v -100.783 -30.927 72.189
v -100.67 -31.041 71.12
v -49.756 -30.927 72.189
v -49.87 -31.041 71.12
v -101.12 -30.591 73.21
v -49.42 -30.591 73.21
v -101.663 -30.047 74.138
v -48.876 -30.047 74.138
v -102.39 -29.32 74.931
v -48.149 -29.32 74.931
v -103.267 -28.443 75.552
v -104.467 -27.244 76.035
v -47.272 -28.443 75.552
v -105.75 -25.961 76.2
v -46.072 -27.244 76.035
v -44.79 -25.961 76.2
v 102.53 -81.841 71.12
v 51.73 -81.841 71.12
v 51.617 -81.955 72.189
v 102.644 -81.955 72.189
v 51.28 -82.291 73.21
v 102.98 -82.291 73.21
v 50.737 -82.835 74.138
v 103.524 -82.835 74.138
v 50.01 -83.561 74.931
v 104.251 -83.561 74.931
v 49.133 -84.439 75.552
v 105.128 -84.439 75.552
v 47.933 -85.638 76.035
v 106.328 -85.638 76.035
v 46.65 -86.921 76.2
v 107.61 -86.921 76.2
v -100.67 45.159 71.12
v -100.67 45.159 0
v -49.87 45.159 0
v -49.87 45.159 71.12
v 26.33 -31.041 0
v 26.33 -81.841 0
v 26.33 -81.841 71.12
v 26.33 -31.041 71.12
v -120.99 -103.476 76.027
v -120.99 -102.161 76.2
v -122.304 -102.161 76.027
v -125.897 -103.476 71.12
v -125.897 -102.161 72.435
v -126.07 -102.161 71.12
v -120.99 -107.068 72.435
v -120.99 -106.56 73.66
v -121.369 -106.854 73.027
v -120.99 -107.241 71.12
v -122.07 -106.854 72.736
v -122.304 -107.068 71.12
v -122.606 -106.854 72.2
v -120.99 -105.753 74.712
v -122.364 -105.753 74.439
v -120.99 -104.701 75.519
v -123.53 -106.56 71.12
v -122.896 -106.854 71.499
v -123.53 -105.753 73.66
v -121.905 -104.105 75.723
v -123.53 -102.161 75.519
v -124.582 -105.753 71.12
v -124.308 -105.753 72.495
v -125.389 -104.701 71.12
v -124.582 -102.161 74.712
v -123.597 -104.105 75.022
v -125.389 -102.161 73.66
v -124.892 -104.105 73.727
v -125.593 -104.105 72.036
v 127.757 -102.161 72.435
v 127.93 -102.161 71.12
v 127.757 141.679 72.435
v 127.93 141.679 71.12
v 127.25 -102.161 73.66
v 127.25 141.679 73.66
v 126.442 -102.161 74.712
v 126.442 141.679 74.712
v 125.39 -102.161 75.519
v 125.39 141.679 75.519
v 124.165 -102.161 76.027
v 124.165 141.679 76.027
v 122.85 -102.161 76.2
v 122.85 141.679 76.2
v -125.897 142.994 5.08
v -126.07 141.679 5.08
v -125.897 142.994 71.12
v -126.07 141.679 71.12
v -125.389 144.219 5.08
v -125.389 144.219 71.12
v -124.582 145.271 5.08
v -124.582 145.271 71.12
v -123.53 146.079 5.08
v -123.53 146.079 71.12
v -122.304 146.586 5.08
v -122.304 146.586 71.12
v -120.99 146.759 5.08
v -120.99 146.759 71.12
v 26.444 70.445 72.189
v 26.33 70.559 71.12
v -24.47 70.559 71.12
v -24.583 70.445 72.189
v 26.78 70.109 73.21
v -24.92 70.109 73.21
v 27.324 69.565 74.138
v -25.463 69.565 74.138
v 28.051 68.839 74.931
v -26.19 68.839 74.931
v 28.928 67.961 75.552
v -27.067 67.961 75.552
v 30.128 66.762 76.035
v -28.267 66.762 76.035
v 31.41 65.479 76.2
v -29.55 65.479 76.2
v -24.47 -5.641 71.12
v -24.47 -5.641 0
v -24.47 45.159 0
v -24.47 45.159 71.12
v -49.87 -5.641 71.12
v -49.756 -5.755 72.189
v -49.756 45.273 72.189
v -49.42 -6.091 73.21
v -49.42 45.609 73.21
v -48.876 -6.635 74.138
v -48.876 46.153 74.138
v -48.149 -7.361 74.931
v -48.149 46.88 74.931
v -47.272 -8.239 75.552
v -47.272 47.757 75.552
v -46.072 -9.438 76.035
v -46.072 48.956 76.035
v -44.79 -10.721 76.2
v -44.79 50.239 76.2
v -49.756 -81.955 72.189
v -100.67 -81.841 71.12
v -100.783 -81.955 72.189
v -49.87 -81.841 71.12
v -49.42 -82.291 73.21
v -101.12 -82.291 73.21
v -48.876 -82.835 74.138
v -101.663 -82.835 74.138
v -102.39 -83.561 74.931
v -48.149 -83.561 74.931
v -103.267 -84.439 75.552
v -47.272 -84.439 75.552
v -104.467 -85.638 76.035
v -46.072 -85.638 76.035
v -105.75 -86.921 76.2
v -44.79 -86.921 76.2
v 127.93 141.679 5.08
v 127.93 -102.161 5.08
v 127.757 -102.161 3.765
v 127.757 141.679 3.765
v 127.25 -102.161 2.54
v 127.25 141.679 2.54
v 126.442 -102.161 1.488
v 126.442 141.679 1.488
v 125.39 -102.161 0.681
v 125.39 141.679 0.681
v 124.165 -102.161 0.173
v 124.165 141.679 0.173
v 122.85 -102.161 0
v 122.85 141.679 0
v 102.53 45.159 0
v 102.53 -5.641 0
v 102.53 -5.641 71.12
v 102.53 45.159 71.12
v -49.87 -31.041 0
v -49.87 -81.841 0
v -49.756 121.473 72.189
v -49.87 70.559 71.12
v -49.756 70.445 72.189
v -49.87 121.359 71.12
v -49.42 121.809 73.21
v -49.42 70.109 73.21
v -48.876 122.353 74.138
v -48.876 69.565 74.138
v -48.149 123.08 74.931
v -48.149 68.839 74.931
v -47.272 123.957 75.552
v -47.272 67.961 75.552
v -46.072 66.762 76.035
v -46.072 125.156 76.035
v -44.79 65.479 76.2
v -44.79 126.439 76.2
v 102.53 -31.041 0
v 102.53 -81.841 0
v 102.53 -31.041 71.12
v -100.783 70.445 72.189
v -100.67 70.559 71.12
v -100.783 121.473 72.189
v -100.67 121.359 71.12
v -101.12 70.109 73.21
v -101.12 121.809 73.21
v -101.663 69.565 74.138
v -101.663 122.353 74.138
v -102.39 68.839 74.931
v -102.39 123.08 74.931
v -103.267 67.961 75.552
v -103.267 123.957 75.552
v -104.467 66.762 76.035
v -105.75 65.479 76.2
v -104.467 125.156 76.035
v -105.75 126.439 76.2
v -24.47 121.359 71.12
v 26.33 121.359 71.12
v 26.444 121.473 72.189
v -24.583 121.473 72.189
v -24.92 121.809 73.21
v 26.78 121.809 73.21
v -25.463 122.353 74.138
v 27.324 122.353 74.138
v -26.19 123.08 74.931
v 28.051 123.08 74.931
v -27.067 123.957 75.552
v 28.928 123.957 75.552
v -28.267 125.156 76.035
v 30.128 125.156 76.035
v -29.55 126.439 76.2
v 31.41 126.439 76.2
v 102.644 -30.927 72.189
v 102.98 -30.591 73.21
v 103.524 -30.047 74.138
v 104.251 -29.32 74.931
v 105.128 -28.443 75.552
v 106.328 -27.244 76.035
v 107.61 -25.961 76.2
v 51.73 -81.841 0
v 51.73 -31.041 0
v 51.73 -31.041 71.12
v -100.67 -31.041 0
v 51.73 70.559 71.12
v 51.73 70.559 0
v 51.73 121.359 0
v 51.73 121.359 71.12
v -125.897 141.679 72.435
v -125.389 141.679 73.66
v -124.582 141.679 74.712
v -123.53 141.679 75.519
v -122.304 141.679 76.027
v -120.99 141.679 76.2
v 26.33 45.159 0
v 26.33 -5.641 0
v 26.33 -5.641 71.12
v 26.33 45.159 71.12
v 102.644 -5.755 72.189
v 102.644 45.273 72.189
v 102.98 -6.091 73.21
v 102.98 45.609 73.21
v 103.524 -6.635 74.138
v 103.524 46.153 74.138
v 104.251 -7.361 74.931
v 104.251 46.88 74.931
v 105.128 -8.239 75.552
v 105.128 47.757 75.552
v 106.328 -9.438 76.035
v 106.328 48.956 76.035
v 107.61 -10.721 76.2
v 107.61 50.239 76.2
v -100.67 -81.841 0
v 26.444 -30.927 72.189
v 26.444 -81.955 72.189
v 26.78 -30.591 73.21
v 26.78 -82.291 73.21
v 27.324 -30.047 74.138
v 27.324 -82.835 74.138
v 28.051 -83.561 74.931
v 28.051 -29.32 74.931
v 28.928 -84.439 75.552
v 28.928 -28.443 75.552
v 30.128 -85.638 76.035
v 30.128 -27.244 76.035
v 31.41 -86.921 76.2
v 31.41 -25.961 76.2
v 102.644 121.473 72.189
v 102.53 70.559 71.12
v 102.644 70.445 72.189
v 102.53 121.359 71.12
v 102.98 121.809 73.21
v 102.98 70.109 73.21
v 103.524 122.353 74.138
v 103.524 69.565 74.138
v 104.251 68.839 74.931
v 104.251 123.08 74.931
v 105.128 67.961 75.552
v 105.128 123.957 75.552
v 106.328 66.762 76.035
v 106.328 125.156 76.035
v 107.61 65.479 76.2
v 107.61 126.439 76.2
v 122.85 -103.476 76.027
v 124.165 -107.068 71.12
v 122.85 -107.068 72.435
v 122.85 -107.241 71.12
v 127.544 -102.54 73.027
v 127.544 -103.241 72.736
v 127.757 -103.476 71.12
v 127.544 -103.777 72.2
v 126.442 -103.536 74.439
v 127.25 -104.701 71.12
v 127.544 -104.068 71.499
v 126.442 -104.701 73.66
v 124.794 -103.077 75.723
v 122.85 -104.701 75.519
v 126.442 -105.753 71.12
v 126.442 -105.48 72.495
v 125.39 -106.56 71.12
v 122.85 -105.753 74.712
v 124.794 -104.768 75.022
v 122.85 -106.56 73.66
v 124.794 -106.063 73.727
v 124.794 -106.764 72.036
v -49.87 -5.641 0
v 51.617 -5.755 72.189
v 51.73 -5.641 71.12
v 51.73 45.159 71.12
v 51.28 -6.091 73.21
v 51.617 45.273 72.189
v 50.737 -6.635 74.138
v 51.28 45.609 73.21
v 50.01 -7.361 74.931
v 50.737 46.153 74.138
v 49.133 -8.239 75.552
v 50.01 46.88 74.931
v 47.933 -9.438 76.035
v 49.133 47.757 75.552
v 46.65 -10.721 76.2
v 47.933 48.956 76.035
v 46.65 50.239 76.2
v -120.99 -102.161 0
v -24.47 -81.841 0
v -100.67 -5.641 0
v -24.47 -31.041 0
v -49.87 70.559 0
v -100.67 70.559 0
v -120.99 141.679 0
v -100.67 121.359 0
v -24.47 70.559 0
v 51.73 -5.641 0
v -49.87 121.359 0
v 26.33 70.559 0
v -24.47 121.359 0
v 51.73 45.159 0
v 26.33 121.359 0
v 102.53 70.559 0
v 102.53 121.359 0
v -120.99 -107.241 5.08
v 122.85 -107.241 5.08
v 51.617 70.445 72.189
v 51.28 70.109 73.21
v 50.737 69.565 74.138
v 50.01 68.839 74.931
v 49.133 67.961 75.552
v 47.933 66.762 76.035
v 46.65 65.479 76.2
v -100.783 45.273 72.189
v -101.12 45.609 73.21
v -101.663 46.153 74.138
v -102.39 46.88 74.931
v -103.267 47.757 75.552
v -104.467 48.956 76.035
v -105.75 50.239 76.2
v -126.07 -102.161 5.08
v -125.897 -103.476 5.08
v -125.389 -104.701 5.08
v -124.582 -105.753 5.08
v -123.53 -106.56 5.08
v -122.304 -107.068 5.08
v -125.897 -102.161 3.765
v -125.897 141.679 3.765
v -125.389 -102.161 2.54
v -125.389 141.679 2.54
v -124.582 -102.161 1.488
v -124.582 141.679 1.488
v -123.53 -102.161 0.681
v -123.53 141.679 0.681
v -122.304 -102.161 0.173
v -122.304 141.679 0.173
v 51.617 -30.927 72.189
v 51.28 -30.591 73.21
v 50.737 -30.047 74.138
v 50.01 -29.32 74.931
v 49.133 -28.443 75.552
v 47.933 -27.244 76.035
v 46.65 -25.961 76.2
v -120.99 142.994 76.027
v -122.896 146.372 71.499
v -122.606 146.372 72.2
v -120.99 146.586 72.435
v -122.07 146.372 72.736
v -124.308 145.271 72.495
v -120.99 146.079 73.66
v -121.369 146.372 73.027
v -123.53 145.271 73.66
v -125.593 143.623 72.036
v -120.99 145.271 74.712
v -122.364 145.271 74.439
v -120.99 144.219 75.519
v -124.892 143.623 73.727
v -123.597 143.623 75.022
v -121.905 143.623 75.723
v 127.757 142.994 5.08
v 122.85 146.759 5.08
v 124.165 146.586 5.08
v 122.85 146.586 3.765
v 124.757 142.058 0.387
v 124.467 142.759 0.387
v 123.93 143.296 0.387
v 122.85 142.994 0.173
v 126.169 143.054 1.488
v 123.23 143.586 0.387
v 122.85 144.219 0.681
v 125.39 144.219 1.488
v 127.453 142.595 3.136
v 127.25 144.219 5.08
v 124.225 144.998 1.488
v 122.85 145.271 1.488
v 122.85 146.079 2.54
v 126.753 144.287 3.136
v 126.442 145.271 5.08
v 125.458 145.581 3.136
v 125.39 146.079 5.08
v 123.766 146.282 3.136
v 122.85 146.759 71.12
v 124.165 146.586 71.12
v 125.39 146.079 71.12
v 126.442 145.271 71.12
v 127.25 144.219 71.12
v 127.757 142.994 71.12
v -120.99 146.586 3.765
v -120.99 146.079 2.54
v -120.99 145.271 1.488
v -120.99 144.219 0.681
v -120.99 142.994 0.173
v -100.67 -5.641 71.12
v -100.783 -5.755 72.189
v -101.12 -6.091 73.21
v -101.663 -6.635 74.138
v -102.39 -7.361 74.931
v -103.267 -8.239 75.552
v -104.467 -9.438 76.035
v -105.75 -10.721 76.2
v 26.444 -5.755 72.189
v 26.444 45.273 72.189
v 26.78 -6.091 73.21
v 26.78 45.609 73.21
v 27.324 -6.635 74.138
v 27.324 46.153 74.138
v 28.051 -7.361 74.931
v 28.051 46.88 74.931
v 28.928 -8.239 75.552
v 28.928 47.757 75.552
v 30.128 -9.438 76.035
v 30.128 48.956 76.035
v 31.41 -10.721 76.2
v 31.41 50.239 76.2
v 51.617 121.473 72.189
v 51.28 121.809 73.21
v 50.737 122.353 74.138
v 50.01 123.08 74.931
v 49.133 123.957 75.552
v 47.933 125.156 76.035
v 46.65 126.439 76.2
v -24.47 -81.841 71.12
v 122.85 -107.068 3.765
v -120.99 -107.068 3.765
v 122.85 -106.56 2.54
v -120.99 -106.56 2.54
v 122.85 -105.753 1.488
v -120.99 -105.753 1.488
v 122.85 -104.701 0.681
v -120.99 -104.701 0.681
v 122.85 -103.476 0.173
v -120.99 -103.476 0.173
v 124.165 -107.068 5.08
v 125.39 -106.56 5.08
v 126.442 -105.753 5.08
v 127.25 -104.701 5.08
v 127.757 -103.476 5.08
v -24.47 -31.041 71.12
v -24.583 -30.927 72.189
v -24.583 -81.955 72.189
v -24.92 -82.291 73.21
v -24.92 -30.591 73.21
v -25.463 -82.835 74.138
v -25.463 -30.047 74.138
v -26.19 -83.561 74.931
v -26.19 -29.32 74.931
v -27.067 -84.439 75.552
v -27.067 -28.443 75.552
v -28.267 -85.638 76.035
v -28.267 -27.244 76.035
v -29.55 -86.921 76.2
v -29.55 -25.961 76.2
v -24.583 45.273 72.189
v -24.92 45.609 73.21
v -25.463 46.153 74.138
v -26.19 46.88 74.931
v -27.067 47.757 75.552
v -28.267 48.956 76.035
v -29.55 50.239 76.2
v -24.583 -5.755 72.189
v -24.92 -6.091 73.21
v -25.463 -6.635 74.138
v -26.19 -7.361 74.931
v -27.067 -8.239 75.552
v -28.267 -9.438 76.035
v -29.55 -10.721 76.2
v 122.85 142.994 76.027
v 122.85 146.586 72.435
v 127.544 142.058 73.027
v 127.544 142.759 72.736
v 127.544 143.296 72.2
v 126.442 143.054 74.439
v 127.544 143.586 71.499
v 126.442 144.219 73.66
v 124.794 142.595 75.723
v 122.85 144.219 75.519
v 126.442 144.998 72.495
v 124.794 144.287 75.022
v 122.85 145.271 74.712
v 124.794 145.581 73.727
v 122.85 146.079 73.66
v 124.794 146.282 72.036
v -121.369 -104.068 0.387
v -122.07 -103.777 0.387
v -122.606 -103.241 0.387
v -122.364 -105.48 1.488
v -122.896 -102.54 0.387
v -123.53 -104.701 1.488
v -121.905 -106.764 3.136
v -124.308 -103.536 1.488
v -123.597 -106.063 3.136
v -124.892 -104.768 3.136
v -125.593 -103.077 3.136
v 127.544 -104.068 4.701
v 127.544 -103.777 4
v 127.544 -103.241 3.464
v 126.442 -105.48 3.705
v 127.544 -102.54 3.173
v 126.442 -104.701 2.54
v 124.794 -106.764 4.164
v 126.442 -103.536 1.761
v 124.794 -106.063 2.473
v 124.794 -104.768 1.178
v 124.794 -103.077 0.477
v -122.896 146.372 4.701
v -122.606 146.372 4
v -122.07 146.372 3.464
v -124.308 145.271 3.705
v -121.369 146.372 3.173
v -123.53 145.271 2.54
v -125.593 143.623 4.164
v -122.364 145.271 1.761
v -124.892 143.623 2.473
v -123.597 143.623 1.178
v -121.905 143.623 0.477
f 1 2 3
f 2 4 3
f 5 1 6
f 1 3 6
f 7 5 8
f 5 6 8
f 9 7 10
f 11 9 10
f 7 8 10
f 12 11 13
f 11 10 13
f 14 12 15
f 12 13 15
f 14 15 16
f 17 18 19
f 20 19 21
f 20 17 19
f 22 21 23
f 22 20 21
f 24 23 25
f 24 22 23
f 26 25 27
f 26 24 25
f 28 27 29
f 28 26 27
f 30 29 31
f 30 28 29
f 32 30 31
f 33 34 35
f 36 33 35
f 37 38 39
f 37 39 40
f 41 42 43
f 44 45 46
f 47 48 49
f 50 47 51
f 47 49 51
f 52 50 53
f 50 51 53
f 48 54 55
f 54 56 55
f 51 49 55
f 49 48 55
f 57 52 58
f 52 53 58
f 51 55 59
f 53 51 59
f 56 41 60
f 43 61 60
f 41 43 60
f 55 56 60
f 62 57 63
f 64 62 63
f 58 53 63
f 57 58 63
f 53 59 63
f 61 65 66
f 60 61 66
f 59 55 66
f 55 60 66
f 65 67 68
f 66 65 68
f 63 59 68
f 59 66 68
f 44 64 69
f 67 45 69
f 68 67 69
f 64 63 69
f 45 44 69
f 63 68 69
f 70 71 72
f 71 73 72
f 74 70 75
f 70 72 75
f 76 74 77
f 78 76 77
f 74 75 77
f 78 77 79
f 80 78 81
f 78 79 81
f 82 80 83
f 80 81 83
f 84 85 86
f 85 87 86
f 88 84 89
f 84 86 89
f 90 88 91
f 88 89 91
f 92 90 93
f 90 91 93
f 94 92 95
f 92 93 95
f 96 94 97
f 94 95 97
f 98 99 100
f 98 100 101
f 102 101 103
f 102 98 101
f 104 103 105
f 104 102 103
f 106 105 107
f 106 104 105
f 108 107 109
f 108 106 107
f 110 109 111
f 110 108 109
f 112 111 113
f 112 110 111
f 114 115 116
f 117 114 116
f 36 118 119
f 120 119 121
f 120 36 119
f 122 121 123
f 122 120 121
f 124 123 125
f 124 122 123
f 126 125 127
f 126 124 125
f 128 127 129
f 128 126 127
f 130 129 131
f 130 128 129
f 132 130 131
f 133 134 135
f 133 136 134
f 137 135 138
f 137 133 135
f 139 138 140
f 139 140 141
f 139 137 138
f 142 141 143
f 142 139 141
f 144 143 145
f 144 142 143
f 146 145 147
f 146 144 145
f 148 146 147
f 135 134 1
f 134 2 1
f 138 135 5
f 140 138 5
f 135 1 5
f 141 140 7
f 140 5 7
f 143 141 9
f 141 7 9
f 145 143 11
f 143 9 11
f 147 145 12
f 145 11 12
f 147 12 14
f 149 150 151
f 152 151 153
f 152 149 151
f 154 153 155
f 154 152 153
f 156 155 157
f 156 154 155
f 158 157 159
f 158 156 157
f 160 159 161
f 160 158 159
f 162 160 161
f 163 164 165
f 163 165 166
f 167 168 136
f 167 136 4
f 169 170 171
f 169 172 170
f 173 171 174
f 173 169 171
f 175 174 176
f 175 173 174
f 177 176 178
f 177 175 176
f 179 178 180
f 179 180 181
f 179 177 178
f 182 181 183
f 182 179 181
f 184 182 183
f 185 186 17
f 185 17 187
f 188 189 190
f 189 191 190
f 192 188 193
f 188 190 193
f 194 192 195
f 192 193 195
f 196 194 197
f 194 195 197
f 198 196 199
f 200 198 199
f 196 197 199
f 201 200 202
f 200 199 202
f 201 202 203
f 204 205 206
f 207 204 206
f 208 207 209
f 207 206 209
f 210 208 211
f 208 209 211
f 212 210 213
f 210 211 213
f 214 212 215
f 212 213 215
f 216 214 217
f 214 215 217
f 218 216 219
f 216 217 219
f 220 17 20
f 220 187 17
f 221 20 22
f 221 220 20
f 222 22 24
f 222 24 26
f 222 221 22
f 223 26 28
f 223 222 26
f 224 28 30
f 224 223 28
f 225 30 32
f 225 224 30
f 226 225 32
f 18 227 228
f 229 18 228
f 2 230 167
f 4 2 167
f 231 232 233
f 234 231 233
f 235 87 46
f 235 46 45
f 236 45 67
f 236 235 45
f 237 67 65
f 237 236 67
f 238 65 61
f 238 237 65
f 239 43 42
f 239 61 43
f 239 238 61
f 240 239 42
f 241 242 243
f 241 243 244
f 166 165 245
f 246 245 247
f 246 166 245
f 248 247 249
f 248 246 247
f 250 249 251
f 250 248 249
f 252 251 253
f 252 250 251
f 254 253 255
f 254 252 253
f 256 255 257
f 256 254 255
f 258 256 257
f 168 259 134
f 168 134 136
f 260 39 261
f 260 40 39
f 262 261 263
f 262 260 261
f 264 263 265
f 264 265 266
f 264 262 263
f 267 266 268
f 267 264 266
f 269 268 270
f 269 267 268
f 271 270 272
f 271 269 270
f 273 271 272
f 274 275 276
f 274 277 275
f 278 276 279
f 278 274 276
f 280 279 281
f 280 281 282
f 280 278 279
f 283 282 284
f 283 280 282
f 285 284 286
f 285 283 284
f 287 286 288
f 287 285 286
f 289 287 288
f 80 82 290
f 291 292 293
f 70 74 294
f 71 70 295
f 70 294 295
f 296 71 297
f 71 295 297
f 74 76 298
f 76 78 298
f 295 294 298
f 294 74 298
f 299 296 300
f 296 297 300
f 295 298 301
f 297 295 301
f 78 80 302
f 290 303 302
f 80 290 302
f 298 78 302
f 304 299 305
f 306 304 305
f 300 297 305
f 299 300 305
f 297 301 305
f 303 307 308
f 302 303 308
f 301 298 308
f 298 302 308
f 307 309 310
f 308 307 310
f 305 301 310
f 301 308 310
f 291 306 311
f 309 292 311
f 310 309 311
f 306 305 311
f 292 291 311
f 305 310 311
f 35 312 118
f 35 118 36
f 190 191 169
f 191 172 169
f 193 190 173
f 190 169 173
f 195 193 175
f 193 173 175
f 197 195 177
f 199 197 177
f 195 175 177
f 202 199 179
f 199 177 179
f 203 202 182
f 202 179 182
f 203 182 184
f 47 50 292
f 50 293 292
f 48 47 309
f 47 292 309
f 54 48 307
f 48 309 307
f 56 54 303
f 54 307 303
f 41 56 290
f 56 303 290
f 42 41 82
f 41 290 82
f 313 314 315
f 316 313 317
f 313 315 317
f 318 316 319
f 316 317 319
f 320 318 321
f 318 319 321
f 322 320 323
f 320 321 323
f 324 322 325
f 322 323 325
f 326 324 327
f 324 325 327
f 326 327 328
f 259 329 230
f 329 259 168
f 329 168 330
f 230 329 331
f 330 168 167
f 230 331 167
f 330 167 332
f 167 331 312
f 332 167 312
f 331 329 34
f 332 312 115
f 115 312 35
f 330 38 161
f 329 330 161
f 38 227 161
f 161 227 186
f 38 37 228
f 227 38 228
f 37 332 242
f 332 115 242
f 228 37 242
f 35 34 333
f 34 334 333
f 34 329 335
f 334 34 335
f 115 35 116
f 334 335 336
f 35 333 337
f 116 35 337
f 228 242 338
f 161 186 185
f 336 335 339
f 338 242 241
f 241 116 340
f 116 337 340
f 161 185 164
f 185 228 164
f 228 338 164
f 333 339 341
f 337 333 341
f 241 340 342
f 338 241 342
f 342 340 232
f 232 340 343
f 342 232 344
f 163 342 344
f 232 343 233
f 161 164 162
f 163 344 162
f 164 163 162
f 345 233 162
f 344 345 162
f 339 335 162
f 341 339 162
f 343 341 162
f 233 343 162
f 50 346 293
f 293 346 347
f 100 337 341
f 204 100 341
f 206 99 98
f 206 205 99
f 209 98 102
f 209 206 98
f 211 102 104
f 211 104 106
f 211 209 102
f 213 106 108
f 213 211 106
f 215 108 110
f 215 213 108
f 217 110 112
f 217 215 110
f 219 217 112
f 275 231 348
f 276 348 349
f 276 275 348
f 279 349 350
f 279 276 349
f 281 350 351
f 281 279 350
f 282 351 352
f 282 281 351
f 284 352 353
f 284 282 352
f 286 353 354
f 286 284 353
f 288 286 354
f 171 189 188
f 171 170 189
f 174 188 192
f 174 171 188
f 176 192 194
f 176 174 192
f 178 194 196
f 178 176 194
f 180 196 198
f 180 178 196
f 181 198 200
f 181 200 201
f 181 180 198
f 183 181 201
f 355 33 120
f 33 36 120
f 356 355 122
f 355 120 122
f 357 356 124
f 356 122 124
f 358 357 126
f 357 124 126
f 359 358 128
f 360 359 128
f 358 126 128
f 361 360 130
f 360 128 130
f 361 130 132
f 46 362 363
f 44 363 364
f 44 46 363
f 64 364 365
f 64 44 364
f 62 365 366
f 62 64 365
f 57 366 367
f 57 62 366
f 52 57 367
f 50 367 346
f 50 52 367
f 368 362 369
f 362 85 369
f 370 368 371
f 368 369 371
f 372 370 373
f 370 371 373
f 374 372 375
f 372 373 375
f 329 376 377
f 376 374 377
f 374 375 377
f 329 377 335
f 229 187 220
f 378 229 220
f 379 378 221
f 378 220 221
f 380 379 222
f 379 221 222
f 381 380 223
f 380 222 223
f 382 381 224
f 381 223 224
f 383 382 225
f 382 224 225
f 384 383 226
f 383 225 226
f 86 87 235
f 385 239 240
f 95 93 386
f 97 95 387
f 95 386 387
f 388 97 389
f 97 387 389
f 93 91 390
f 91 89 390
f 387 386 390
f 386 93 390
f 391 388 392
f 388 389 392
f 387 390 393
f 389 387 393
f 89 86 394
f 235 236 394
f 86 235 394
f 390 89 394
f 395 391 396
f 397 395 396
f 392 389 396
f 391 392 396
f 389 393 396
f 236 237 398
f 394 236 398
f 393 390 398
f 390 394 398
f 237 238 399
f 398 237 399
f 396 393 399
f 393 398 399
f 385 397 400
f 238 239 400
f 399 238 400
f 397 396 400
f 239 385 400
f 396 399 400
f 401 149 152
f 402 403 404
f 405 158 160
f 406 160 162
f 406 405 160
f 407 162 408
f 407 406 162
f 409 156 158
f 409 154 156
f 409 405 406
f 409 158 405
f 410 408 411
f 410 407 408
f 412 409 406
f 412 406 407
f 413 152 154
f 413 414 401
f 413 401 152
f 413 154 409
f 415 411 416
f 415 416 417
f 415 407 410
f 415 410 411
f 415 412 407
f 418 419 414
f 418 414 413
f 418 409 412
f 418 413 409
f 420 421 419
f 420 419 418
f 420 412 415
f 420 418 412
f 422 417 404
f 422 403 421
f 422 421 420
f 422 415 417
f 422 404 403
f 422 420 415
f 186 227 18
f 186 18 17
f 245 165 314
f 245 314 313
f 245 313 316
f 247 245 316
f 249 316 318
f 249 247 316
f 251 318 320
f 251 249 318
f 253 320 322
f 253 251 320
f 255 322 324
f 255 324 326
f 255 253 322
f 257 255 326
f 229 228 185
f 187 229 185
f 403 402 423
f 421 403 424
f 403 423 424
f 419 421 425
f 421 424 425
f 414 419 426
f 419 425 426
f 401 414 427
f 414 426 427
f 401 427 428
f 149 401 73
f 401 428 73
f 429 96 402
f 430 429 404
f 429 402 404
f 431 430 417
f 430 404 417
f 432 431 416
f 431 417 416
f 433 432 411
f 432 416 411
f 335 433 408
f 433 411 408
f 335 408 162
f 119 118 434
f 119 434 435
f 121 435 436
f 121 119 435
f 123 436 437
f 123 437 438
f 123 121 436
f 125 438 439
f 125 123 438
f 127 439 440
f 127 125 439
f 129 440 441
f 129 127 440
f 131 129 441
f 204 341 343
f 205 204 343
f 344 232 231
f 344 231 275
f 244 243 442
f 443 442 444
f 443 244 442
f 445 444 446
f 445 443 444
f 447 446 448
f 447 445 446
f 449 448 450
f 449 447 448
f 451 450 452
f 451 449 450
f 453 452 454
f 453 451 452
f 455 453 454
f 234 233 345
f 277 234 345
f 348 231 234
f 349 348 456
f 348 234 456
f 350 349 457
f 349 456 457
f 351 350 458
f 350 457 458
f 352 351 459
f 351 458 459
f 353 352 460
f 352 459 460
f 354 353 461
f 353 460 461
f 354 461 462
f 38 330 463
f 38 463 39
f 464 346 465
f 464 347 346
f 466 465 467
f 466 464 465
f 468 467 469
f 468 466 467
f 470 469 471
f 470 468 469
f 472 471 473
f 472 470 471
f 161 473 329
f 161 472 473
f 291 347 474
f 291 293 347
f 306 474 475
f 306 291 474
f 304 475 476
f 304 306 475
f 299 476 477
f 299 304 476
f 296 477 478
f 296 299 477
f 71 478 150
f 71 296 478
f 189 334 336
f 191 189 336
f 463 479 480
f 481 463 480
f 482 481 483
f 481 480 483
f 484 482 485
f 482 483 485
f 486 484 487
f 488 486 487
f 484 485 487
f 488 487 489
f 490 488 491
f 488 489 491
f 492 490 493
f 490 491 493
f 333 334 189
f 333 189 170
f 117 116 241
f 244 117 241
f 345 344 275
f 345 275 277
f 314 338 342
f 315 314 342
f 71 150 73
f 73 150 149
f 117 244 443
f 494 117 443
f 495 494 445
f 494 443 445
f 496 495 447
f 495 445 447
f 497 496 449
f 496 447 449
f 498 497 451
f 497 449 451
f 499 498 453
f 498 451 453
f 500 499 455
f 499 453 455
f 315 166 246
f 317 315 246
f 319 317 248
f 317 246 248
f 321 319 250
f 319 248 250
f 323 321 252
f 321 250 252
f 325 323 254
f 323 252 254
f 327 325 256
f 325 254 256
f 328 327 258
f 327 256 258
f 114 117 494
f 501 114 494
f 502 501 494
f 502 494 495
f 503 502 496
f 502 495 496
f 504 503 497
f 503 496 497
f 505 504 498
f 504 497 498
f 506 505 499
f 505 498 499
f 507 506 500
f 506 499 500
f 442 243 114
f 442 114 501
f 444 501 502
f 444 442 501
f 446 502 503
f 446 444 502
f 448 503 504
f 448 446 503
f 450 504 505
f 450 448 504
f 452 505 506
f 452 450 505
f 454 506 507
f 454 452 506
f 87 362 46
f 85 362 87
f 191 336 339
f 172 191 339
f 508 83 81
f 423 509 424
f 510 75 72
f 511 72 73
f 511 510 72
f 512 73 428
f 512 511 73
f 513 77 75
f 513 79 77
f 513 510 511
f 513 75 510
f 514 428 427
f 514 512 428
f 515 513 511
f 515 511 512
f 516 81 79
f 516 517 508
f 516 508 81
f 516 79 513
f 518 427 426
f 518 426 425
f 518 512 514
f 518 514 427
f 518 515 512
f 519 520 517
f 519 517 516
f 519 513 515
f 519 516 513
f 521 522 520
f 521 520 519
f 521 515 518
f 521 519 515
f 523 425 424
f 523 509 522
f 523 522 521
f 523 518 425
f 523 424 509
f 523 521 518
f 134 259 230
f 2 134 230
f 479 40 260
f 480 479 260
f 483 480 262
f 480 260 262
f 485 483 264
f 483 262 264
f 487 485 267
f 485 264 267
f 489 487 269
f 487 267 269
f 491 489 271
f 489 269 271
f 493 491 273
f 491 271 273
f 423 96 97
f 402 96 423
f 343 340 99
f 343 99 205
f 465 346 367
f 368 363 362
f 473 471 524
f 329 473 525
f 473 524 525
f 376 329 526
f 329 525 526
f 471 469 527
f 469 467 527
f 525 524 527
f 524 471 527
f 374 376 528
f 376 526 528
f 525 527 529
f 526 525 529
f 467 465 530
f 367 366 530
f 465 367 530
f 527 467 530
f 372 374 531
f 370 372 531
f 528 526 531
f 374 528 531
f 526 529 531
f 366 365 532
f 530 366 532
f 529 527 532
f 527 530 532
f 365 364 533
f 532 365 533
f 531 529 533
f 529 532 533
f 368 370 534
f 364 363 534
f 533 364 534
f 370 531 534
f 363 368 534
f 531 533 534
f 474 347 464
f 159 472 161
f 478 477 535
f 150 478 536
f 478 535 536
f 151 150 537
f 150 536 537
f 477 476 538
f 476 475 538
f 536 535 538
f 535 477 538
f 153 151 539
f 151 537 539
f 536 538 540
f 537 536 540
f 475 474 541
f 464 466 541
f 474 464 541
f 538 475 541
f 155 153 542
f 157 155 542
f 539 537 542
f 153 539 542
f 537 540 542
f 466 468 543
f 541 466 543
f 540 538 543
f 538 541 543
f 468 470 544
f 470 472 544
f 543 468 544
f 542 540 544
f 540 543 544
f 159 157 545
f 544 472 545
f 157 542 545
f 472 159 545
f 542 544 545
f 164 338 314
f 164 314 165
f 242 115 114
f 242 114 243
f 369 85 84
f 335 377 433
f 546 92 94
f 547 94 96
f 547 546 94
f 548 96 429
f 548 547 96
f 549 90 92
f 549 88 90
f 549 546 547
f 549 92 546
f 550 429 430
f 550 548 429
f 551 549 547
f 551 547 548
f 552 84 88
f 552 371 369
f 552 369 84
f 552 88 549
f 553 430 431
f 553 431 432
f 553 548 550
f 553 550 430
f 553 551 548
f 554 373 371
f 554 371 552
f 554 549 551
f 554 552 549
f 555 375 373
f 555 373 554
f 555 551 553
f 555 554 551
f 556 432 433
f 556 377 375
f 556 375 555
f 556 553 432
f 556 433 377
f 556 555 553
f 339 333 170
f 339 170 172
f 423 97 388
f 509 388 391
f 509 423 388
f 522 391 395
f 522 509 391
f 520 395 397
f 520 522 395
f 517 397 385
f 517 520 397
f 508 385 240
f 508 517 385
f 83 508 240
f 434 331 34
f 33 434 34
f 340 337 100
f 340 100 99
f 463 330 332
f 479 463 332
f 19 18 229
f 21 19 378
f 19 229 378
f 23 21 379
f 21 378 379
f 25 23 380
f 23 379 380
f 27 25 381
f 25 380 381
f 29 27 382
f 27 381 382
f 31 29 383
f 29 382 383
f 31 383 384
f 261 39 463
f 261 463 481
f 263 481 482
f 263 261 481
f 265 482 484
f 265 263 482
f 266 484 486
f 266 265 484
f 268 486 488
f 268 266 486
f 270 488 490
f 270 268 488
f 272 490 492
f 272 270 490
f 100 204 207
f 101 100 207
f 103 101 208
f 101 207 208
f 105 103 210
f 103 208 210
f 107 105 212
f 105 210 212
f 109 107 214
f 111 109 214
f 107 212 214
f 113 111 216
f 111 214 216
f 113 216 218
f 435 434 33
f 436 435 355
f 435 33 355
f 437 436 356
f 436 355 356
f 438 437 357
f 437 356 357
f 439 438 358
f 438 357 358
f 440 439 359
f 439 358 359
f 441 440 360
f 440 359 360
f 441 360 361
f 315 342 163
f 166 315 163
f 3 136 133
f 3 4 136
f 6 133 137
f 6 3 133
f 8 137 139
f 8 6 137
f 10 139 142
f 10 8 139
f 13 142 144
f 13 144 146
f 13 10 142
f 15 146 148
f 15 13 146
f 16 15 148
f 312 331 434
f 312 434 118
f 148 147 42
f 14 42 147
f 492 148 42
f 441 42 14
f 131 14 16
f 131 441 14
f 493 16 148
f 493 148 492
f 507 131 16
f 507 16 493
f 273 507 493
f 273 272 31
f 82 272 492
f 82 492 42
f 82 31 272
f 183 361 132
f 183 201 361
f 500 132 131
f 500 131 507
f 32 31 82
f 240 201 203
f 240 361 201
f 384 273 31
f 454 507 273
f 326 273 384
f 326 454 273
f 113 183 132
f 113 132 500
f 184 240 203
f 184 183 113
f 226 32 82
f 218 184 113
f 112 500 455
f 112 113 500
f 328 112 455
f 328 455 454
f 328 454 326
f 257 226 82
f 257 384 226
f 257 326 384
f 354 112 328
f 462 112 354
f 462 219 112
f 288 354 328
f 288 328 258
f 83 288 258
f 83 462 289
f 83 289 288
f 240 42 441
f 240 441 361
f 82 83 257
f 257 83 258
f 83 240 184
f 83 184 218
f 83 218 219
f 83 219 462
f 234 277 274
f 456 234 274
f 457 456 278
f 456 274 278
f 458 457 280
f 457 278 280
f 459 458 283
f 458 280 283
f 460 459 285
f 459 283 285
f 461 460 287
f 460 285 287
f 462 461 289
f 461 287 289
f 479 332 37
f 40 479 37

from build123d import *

# Parameters (mm, degrees)
F0_W     = 254
F0_H     = 254
F0_W_2   = 50.8
F0_H_2   = 50.8
F1_DEPTH = 76.2
F2_R     = 5.08


with BuildPart() as f1:
    # F0 (on Top) → F1 (new body)
    with BuildSketch(Plane.XY):
        with Locations((0.930347, 19.759098)):
            Rectangle(F0_W, F0_H)
        with Locations((-75.269653, -56.440902)):
            Rectangle(F0_W_2, F0_H_2, mode=Mode.SUBTRACT)
        with Locations((0.930347, -56.440902)):
            Rectangle(F0_W_2, F0_H_2, mode=Mode.SUBTRACT)
        with Locations((77.130347, -56.440902)):
            Rectangle(F0_W_2, F0_H_2, mode=Mode.SUBTRACT)
        with Locations((-75.269653, 19.759098)):
            Rectangle(F0_W_2, F0_H_2, mode=Mode.SUBTRACT)
        with Locations((-75.269653, 95.959098)):
            Rectangle(F0_W_2, F0_H_2, mode=Mode.SUBTRACT)
        with Locations((0.930347, 19.759098)):
            Rectangle(F0_W_2, F0_H_2, mode=Mode.SUBTRACT)
        with Locations((77.130347, 19.759098)):
            Rectangle(F0_W_2, F0_H_2, mode=Mode.SUBTRACT)
        with Locations((0.930347, 95.959098)):
            Rectangle(F0_W_2, F0_H_2, mode=Mode.SUBTRACT)
        with Locations((77.130347, 95.959098)):
            Rectangle(F0_W_2, F0_H_2, mode=Mode.SUBTRACT)
    extrude(amount=F1_DEPTH)

    # F2
    f2_edges = [f1.edges().sort_by_distance(p)[0] for p in [
        (-126.069653, 19.759098, 76.2),
        (0.930347, -107.240902, 76.2),
        (-126.069653, -107.240902, 38.1),
        (0.930347, -107.240902, 0),
        (-126.069653, 19.759098, 0),
        (-126.069653, 146.759098, 38.1),
        (0.930347, 146.759098, 76.2),
        (127.930347, 19.759098, 76.2),
        (-75.269653, -31.040902, 76.2),
        (-49.869653, -56.440902, 76.2),
        (-75.269653, -81.840902, 76.2),
        (-100.669653, -56.440902, 76.2),
        (-24.469653, -56.440902, 76.2),
        (0.930347, -31.040902, 76.2),
        (26.330347, -56.440902, 76.2),
        (0.930347, -81.840902, 76.2),
        (77.130347, -31.040902, 76.2),
        (102.530347, -56.440902, 76.2),
        (77.130347, -81.840902, 76.2),
        (51.730347, -56.440902, 76.2),
        (-75.269653, 45.159098, 76.2),
        (-49.869653, 19.759098, 76.2),
        (-75.269653, -5.640902, 76.2),
        (-100.669653, 19.759098, 76.2),
        (-100.669653, 95.959098, 76.2),
        (-75.269653, 121.359098, 76.2),
        (-49.869653, 95.959098, 76.2),
        (-75.269653, 70.559098, 76.2),
        (-24.469653, 19.759098, 76.2),
        (0.930347, 45.159098, 76.2),
        (26.330347, 19.759098, 76.2),
        (0.930347, -5.640902, 76.2),
        (77.130347, 45.159098, 76.2),
        (102.530347, 19.759098, 76.2),
        (77.130347, -5.640902, 76.2),
        (51.730347, 19.759098, 76.2),
        (-24.469653, 95.959098, 76.2),
        (0.930347, 121.359098, 76.2),
        (26.330347, 95.959098, 76.2),
        (0.930347, 70.559098, 76.2),
        (77.130347, 121.359098, 76.2),
        (102.530347, 95.959098, 76.2),
        (77.130347, 70.559098, 76.2),
        (51.730347, 95.959098, 76.2),
        (127.930347, -107.240902, 38.1),
        (127.930347, 146.759098, 38.1),
        (127.930347, 19.759098, 0),
        (0.930347, 146.759098, 0),
    ]]
    fillet(f2_edges, radius=F2_R)


solid = f1.part
